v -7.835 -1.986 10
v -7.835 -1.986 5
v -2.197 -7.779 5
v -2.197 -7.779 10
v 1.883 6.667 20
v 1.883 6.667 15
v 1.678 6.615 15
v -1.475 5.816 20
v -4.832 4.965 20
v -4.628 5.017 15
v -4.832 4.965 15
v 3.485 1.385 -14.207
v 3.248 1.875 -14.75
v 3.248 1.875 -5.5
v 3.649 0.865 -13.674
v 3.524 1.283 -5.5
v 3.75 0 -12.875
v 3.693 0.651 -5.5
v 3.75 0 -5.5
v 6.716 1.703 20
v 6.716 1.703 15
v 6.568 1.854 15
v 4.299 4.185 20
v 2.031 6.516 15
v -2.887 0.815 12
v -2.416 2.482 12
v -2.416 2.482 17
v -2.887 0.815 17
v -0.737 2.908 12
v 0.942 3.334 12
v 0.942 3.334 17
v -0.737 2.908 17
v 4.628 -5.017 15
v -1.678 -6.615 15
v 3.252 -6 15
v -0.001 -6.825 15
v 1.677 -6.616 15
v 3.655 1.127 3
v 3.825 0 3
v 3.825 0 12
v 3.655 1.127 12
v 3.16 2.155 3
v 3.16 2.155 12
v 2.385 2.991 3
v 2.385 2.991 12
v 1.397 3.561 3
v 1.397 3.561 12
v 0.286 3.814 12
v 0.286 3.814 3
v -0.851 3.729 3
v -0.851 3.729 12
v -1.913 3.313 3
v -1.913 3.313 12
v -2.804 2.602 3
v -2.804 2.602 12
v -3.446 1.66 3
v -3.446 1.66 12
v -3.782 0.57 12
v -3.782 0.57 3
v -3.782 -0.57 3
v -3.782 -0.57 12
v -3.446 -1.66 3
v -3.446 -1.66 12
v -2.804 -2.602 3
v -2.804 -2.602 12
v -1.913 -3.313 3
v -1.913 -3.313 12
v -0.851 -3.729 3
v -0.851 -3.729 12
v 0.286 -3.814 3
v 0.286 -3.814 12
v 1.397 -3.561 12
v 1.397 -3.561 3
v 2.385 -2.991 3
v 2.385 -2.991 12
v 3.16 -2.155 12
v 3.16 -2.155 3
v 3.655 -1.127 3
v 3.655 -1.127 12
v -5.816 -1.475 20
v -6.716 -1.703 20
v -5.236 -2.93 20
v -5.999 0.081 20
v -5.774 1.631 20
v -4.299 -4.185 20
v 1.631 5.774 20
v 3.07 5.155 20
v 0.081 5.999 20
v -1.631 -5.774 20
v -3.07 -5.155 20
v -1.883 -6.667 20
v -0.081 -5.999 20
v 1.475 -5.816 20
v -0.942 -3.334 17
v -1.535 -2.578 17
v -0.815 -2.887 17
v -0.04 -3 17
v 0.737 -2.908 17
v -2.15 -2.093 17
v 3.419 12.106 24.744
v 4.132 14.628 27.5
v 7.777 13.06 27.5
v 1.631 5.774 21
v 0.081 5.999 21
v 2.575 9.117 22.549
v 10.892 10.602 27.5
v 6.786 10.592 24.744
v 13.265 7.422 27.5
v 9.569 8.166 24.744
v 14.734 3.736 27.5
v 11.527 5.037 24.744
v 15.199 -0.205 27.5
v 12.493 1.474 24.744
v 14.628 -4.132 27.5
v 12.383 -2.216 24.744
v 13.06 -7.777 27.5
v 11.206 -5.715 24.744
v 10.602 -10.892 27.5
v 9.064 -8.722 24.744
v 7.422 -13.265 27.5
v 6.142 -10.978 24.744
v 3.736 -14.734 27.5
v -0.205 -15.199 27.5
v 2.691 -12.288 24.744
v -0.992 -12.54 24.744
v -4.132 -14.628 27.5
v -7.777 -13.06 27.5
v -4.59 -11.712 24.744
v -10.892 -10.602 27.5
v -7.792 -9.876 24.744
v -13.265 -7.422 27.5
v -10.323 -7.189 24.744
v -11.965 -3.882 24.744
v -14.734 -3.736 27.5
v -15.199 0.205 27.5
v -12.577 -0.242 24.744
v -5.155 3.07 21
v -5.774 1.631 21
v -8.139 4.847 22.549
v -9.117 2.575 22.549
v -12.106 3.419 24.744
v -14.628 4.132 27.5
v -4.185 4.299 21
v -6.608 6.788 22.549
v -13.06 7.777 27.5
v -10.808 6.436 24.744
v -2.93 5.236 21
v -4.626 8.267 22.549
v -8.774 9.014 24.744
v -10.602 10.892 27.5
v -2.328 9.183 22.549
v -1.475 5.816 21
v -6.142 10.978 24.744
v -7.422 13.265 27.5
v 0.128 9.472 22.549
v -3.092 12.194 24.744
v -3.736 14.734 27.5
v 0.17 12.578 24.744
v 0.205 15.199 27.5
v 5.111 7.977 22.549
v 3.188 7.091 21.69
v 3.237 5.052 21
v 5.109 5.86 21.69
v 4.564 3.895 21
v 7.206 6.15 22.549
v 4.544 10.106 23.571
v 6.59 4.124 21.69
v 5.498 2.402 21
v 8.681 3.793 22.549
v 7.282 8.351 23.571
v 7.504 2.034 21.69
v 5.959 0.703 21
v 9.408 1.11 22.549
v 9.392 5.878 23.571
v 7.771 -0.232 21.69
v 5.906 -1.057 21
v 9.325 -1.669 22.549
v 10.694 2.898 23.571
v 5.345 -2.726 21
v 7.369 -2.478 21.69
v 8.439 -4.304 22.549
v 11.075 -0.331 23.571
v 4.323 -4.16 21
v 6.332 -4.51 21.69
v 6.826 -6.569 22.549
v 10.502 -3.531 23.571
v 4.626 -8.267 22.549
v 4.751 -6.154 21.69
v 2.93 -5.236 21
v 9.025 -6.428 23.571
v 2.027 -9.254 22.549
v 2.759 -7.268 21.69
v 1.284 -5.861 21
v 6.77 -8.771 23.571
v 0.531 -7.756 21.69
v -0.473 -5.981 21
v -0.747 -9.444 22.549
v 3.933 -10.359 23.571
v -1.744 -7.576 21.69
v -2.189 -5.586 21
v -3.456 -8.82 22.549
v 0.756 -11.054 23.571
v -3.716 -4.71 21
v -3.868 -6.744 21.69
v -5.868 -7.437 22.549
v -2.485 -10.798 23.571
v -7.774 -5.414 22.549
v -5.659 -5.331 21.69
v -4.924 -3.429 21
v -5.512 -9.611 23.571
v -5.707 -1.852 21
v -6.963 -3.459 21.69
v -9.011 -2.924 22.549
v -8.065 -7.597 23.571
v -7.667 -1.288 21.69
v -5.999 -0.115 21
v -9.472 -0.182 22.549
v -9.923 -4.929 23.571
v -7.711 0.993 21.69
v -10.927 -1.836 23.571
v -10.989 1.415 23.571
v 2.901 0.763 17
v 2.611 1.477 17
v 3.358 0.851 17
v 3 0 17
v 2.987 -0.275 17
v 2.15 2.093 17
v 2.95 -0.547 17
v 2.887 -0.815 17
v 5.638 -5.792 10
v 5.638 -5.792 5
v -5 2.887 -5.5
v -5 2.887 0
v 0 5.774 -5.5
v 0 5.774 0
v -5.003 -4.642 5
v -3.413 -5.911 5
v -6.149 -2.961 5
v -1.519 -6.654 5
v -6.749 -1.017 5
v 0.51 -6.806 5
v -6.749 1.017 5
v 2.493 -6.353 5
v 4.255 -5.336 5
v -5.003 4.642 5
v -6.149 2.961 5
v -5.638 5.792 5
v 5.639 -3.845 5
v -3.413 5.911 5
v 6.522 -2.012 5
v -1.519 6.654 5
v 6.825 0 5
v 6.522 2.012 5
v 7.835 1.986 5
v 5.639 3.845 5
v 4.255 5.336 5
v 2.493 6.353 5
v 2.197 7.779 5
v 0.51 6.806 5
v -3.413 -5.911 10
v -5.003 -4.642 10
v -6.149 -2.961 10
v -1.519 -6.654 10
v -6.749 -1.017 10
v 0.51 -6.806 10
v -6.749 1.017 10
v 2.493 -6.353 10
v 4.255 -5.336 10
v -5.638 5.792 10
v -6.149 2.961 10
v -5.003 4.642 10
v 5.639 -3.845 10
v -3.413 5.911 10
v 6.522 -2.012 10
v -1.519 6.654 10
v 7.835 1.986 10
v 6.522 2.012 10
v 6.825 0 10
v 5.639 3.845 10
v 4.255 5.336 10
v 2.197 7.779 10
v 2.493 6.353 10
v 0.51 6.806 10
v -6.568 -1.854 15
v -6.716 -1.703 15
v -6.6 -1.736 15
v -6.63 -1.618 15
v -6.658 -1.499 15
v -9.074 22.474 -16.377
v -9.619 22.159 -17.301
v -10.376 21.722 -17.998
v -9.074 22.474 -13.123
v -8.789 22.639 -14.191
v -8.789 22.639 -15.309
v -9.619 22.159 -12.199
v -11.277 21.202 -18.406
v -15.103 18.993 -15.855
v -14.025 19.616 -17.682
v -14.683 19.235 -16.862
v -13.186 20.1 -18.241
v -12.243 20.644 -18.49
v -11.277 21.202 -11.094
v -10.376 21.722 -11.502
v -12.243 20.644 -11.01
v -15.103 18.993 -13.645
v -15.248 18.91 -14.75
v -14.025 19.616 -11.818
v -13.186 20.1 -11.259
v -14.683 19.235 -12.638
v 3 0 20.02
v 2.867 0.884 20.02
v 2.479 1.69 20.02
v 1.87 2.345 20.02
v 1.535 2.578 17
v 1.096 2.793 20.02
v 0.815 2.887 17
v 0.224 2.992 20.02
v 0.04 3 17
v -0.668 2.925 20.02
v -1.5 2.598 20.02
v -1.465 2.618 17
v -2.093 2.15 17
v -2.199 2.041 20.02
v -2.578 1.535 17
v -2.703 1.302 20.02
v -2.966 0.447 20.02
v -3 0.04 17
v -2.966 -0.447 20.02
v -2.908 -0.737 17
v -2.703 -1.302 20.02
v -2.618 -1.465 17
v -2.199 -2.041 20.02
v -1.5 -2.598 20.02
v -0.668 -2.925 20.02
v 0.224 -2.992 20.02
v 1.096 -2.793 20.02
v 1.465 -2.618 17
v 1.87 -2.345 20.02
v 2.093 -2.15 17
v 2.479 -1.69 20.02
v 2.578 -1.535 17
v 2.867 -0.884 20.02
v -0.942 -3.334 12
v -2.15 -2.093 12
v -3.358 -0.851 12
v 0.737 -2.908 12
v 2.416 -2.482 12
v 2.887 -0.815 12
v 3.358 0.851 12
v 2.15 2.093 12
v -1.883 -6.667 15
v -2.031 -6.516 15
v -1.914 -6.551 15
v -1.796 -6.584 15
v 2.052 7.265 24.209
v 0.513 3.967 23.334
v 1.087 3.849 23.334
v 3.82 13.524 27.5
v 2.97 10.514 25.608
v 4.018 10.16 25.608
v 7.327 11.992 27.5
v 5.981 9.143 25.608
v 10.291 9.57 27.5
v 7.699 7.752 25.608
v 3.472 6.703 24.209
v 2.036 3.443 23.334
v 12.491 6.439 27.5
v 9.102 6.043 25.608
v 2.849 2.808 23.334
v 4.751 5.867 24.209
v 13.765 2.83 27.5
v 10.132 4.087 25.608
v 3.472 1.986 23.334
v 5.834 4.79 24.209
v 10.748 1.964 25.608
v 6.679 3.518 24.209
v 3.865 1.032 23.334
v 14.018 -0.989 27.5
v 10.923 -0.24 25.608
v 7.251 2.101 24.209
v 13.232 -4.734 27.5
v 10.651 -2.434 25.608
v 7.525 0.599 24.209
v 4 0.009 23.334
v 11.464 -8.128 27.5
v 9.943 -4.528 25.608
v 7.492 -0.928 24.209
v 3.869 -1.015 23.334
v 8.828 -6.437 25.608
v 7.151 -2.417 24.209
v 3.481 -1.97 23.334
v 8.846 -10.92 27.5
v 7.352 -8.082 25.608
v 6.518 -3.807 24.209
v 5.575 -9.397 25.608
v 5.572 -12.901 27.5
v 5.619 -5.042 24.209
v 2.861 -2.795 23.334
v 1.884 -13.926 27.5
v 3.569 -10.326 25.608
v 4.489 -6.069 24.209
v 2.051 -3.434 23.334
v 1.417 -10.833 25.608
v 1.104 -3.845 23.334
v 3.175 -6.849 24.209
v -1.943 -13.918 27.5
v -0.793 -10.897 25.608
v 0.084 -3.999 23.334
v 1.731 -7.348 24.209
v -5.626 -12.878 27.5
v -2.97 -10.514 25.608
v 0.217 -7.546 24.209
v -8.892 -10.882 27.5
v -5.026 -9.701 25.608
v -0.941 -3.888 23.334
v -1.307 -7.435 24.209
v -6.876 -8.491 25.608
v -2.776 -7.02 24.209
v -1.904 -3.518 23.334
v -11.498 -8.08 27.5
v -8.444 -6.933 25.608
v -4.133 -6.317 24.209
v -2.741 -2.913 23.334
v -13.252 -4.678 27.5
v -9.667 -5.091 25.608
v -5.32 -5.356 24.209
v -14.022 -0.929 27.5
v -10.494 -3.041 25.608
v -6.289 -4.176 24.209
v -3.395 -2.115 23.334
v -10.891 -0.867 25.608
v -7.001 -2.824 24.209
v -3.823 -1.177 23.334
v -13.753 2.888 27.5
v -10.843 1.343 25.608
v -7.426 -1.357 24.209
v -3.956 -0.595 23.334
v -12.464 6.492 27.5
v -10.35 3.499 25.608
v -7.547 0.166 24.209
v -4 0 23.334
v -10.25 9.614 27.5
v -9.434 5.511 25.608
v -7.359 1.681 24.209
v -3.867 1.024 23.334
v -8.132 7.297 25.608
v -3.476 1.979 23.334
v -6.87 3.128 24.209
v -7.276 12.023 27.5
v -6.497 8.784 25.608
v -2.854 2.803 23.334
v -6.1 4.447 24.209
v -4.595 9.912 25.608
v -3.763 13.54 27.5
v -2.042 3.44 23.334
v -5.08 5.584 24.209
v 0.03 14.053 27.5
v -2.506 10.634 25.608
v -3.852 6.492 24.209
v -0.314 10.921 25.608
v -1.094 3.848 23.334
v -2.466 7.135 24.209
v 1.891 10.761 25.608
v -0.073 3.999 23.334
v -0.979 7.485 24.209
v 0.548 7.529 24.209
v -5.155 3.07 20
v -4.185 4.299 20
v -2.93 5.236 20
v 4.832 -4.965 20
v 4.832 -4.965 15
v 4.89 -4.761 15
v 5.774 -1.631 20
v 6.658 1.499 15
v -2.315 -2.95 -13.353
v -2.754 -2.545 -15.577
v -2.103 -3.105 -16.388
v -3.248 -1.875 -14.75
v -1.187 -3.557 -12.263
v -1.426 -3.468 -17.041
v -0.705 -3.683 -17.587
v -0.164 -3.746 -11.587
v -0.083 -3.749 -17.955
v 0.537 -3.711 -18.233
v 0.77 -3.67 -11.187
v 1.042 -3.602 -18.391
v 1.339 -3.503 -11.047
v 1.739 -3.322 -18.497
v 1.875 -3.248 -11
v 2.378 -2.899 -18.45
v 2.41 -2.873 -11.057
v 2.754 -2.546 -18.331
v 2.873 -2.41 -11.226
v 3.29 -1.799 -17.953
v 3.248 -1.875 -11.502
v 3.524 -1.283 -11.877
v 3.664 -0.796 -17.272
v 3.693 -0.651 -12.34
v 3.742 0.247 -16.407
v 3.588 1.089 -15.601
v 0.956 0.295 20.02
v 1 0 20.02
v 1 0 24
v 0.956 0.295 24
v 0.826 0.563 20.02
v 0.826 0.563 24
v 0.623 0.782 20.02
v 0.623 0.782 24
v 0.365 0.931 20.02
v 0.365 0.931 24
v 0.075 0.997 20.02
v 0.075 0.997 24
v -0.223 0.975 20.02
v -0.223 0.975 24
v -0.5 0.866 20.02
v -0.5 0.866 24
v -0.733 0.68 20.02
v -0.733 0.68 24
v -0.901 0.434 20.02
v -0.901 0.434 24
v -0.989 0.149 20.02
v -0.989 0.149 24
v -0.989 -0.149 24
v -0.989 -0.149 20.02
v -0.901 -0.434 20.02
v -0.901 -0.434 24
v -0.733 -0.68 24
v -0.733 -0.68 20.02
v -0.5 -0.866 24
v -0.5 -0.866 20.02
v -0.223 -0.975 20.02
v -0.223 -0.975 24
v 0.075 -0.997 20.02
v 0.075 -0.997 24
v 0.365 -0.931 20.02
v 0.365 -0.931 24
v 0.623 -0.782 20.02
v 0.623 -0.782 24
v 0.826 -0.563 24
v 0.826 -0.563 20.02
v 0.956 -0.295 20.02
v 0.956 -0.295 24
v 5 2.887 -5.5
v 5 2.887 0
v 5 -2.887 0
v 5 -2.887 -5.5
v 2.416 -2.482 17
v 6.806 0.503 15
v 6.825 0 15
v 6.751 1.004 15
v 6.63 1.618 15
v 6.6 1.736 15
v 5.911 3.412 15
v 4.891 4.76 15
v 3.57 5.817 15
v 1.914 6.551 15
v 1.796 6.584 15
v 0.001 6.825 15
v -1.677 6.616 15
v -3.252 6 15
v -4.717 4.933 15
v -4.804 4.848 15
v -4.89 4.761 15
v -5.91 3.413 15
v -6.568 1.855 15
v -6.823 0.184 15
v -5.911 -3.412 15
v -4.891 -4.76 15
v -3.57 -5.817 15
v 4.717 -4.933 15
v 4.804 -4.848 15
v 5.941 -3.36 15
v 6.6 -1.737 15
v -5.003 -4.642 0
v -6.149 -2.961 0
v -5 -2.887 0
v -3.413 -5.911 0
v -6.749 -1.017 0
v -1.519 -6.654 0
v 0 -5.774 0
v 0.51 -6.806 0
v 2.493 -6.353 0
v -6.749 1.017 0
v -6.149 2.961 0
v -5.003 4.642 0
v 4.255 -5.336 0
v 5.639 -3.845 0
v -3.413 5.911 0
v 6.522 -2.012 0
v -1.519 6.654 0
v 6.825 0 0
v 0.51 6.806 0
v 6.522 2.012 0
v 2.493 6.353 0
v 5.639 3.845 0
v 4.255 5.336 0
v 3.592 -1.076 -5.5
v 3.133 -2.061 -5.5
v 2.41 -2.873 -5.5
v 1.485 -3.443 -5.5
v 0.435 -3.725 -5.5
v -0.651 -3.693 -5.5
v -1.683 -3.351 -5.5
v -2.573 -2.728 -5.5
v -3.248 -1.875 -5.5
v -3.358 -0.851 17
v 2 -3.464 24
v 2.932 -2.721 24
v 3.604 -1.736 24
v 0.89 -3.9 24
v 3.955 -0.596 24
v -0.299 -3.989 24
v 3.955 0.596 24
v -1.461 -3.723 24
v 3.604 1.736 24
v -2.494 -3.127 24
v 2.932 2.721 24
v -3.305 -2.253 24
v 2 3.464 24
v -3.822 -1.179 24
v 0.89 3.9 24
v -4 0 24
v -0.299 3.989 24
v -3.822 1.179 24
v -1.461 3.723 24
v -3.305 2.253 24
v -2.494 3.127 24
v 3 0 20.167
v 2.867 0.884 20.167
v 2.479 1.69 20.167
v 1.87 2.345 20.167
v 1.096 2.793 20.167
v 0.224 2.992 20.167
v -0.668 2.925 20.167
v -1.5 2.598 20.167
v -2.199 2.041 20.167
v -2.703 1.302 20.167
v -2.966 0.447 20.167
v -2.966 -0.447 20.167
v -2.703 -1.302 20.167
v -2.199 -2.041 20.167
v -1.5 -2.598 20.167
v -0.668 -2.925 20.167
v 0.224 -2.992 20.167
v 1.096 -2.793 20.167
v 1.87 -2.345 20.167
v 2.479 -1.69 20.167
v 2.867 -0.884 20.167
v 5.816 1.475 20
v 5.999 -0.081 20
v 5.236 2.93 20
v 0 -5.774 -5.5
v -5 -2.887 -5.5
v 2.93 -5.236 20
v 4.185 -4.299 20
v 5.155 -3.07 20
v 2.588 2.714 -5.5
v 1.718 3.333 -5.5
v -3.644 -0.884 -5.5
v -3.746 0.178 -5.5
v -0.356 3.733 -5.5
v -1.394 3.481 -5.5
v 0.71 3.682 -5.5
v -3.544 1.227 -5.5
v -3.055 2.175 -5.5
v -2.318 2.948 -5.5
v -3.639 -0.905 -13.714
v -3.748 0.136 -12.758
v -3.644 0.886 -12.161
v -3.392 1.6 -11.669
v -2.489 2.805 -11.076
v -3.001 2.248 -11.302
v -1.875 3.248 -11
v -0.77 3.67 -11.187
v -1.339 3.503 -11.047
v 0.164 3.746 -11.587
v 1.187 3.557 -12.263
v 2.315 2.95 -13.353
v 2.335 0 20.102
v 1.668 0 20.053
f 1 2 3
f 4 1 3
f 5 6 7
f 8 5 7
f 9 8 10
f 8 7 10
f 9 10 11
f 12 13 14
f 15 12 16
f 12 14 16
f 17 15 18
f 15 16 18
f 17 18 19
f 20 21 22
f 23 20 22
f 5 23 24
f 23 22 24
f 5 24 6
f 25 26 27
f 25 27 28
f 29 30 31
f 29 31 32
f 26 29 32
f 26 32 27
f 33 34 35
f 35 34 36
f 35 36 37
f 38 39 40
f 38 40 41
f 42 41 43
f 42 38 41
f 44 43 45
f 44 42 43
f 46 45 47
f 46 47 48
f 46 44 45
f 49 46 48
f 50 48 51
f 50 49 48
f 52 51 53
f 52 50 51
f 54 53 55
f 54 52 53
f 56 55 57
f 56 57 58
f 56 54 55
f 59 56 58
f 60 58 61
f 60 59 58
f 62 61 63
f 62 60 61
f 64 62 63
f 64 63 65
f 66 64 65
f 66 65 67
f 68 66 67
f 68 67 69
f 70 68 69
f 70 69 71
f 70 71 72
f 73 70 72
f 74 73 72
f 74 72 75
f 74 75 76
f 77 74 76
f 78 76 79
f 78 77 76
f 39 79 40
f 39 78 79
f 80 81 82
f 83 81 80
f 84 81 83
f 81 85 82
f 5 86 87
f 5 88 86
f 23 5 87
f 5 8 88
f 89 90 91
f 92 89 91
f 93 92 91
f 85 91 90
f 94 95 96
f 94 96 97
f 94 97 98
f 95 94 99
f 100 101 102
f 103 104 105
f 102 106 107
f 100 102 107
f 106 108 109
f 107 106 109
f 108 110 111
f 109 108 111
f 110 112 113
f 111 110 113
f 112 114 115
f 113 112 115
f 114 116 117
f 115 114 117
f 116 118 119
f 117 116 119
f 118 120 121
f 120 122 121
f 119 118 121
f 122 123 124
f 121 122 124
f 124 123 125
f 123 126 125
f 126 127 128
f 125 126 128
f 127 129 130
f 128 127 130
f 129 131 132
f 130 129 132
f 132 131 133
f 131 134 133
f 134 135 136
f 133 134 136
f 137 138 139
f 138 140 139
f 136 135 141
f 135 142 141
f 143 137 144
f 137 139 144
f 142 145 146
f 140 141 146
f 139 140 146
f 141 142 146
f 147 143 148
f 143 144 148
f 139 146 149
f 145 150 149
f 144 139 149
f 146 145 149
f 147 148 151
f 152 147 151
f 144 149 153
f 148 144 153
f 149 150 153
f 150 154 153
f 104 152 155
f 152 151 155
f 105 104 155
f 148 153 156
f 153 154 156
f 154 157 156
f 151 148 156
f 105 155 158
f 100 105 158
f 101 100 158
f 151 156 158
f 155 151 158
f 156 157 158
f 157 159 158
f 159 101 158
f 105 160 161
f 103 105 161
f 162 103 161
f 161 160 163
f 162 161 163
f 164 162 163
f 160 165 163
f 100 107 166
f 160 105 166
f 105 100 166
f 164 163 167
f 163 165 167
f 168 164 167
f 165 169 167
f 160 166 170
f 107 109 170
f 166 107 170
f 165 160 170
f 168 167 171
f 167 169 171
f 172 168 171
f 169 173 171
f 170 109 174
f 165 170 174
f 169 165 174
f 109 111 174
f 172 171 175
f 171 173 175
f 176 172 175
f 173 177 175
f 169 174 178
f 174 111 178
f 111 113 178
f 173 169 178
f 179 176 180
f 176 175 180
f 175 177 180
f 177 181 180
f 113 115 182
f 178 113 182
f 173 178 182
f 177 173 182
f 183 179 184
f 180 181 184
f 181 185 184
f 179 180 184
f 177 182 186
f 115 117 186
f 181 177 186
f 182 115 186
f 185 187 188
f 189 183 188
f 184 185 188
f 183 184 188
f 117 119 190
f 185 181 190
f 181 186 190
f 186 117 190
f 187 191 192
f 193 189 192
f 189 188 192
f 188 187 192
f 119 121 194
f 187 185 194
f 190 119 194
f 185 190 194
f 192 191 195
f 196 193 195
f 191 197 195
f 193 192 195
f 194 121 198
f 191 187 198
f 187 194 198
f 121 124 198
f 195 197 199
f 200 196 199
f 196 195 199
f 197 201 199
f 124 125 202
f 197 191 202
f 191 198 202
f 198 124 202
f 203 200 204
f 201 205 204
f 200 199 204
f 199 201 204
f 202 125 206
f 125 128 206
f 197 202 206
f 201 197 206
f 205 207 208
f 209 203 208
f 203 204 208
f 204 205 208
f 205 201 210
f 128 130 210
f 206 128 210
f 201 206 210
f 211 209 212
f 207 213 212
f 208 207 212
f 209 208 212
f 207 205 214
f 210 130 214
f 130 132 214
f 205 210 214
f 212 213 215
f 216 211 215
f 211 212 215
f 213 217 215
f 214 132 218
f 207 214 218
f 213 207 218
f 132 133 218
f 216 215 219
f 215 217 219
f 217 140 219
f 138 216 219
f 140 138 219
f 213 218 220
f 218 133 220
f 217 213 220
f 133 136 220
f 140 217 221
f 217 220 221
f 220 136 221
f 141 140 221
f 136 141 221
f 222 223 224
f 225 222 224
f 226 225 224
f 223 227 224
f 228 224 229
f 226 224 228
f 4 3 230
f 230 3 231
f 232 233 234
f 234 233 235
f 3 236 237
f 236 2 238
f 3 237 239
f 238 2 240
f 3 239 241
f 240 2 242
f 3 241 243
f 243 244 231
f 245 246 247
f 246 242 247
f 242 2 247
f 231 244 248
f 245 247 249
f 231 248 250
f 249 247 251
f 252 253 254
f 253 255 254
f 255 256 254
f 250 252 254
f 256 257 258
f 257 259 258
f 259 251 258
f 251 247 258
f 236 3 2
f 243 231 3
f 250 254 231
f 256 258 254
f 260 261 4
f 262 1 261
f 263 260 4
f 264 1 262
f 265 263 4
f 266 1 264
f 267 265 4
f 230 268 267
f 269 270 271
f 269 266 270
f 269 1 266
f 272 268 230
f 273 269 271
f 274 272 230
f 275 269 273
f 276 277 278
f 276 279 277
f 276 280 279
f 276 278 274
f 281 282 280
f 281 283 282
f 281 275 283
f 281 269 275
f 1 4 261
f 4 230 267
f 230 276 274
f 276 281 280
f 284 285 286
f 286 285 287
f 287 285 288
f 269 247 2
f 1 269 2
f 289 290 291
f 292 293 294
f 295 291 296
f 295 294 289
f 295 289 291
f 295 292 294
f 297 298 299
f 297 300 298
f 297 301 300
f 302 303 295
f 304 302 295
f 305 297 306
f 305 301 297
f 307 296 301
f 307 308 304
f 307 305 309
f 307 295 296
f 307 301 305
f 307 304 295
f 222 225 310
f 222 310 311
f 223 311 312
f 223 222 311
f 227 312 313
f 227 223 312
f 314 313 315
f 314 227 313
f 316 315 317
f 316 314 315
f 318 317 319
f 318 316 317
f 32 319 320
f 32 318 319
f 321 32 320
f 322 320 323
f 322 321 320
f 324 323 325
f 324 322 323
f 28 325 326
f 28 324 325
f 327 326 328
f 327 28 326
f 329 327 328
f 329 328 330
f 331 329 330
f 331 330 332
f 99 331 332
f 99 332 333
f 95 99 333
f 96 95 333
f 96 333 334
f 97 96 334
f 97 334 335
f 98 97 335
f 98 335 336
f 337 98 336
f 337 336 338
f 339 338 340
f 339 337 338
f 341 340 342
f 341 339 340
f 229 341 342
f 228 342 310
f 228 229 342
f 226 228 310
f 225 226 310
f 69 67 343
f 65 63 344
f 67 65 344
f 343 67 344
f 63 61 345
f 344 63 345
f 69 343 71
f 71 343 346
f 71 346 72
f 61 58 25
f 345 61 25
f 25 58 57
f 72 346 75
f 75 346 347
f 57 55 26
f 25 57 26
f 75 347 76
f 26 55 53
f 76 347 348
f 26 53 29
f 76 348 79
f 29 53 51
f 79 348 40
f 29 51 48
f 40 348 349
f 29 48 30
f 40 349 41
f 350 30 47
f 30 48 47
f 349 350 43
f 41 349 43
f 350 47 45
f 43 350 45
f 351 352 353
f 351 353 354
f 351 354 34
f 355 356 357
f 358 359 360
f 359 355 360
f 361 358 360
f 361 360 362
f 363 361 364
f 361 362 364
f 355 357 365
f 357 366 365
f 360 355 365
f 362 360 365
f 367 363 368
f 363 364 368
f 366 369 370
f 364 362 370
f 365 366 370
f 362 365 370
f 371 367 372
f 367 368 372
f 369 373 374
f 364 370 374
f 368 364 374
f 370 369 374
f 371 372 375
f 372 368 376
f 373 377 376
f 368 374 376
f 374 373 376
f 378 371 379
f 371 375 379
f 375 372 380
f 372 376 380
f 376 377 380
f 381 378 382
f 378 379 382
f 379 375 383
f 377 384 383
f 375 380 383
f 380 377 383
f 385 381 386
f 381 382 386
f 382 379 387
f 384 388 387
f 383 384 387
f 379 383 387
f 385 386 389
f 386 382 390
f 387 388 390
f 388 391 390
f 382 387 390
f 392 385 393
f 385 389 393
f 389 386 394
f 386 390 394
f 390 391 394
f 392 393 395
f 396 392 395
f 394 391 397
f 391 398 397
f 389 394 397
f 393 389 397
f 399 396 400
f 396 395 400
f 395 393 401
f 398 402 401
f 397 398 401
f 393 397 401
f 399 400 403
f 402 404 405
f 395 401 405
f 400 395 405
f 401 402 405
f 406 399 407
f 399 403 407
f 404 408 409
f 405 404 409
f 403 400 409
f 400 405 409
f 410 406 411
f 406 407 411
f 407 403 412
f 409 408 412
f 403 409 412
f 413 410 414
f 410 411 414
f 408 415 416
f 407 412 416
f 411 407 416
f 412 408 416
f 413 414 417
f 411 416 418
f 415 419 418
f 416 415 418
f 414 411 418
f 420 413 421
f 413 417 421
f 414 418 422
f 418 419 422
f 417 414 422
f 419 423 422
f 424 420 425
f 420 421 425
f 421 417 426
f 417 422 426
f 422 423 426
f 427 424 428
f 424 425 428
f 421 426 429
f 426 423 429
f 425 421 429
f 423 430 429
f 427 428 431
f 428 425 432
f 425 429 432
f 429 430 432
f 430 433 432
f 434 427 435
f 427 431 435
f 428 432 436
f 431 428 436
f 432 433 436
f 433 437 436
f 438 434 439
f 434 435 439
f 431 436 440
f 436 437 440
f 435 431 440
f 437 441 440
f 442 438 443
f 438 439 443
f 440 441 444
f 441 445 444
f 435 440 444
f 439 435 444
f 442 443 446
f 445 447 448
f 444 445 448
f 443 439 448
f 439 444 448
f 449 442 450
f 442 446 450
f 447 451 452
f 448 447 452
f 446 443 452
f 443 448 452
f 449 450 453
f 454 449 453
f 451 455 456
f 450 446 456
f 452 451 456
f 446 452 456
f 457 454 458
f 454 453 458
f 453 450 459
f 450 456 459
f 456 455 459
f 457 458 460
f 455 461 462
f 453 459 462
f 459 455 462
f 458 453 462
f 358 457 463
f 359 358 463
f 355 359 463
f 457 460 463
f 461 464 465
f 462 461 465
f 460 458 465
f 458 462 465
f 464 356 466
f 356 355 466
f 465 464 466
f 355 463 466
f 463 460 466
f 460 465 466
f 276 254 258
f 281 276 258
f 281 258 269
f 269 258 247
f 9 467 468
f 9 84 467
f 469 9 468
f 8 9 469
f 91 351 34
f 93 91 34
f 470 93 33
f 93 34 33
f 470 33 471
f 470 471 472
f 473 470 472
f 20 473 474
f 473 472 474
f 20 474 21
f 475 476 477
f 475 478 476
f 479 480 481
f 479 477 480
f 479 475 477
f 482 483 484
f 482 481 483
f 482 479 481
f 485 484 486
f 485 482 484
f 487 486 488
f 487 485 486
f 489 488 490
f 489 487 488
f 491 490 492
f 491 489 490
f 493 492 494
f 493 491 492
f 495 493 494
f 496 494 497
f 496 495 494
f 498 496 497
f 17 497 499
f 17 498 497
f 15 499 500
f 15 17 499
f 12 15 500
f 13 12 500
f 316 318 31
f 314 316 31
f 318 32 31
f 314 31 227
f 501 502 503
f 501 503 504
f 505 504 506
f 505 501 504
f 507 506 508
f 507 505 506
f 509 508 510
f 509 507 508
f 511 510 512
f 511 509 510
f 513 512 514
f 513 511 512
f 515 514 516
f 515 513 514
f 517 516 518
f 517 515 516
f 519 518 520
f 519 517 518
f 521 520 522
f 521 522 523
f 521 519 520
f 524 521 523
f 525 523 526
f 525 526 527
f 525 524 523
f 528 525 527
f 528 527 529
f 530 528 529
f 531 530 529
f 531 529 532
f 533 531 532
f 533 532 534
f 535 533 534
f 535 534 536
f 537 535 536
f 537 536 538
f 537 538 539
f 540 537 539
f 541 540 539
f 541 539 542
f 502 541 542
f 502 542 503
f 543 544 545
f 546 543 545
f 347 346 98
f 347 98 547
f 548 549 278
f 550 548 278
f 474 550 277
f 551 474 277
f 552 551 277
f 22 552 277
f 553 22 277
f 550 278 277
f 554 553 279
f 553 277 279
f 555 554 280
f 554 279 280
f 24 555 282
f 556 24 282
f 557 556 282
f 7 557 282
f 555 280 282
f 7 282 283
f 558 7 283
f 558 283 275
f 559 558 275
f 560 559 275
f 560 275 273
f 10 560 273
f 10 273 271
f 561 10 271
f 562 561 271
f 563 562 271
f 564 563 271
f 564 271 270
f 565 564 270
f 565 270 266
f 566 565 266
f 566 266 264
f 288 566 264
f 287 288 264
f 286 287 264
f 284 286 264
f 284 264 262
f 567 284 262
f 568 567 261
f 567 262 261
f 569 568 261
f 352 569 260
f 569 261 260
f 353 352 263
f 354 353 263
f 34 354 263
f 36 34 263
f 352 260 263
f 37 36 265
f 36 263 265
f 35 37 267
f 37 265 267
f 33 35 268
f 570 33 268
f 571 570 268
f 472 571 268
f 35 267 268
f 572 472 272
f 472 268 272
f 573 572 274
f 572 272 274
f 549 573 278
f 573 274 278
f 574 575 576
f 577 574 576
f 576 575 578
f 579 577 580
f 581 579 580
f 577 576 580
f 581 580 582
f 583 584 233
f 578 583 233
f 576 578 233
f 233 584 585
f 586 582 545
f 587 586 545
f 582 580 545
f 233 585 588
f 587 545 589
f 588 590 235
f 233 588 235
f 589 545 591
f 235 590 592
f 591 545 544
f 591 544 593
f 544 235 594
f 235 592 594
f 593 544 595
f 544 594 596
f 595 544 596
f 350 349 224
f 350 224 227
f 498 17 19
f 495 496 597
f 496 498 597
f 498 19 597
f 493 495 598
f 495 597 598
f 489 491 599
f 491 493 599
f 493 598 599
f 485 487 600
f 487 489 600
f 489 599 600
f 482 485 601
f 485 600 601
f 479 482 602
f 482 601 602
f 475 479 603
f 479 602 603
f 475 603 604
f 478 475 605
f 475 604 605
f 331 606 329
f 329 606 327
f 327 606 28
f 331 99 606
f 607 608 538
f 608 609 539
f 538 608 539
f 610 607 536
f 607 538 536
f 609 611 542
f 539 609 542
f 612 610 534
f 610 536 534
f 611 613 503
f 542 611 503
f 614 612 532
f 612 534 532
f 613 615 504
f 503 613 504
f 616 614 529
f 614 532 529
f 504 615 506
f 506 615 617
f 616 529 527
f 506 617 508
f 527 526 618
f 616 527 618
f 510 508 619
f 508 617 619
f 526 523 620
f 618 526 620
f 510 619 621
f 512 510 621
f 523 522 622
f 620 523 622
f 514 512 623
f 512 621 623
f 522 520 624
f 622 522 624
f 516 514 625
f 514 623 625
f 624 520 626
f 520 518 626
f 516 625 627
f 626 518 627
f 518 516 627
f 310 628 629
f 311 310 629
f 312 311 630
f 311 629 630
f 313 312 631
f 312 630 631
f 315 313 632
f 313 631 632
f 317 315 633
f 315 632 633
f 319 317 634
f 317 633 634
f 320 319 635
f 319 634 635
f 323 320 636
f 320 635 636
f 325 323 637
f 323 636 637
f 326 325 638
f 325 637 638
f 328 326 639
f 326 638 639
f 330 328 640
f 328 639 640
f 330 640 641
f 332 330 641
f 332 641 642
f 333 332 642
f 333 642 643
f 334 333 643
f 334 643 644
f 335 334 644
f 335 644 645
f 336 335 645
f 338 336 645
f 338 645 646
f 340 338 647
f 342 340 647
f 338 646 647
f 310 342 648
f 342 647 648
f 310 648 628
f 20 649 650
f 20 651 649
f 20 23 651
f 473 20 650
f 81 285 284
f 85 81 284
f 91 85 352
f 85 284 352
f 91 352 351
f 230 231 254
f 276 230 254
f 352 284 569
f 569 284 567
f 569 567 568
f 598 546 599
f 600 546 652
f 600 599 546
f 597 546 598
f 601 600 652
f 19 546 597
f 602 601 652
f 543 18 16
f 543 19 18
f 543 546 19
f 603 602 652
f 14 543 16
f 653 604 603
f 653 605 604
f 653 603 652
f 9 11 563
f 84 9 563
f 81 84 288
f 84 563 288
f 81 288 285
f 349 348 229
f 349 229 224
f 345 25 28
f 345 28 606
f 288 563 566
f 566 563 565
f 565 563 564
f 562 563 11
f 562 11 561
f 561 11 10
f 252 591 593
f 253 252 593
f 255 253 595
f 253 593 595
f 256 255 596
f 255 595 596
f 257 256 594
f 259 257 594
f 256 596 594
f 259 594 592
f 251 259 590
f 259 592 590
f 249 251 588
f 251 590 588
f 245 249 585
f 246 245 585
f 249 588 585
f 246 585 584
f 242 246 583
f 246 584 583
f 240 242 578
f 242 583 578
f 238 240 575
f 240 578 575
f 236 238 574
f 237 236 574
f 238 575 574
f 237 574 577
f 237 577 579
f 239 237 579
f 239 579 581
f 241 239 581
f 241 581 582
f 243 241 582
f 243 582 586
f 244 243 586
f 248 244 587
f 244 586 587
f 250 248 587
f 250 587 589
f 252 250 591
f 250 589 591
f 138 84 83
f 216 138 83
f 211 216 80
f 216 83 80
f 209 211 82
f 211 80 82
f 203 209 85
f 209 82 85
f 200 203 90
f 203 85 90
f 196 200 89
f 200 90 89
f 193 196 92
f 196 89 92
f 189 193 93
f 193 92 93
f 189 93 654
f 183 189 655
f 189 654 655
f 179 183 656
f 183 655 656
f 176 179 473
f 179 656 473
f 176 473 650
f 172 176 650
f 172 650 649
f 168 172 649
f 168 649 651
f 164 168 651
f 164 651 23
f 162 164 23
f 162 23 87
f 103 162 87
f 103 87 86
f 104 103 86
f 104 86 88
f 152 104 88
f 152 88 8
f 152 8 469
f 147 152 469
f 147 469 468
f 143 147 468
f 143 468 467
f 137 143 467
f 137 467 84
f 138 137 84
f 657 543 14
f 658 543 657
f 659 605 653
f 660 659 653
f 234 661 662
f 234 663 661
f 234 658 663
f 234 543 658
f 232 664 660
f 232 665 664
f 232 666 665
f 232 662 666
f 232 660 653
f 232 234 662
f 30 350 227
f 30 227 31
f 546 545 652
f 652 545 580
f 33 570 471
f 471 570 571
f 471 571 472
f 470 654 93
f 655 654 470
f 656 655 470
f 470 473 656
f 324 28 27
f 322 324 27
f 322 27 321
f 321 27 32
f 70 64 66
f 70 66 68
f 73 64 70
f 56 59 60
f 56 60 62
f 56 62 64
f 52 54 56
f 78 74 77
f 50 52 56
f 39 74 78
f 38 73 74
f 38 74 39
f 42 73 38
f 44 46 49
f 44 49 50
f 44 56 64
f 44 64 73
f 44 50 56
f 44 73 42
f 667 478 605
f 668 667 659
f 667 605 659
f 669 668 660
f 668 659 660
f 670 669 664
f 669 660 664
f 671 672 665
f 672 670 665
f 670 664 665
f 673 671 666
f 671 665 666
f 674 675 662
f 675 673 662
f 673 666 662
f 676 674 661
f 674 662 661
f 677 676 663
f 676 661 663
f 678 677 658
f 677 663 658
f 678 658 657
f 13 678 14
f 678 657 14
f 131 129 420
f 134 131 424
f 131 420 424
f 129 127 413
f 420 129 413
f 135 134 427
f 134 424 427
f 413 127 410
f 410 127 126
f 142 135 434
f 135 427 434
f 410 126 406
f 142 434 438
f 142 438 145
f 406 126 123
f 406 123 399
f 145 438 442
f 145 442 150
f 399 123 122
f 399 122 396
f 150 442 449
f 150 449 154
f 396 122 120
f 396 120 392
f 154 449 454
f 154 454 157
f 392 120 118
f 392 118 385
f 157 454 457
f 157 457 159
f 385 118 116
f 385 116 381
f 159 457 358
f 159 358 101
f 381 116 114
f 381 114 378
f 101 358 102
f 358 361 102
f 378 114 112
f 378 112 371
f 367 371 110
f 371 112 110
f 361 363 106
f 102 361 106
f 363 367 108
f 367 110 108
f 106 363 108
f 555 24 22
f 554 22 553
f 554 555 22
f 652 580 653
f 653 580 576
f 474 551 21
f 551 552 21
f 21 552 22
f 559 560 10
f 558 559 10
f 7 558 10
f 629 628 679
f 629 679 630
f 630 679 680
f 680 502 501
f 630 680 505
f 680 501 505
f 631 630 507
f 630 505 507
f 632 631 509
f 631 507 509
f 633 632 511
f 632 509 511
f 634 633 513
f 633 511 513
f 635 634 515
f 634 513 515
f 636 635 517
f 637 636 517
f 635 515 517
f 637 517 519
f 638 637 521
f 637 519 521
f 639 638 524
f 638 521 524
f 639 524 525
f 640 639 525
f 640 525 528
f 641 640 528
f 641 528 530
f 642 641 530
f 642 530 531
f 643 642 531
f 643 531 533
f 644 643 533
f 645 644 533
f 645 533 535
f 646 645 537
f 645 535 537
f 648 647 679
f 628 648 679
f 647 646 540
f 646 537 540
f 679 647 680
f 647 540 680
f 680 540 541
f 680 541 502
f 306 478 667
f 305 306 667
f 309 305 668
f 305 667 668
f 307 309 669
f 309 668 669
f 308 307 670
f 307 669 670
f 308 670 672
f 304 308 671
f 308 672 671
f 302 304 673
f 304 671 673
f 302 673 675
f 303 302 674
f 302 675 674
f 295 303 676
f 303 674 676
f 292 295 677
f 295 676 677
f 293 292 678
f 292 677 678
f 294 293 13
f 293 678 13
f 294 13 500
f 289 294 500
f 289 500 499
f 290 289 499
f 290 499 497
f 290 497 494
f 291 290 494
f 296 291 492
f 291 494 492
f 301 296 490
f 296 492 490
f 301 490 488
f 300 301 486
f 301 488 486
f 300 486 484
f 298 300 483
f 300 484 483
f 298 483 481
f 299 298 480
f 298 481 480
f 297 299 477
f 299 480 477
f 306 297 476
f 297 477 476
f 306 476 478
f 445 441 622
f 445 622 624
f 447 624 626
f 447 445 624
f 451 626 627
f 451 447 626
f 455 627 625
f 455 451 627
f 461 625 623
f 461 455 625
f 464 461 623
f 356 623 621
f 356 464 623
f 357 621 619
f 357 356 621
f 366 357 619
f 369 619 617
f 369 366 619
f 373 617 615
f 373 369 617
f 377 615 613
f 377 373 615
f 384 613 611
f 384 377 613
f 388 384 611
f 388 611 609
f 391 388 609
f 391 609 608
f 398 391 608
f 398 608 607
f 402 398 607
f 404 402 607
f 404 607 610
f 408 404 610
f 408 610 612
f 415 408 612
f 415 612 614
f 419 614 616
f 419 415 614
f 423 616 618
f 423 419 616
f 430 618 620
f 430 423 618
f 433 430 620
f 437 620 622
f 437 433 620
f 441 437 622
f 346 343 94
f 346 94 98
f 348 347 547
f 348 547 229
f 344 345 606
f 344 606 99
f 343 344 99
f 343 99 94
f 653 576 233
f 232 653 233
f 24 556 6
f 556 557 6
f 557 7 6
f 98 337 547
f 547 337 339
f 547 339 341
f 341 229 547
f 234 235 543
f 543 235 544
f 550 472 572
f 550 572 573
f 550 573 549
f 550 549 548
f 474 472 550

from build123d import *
from build123d.topology import SkipClean

# Parameters (mm, degrees)
ESQUISSE1_R             = 6.825
BOSS_EXTRU_1_DEPTH      = 5
BOSS_EXTRU_2_DEPTH      = 5
ESQUISSE3_R             = 6.825
BOSS_EXTRU_3_DEPTH      = 5
BOSS_EXTRU_4_DEPTH      = 5
ESQUISSE5_R             = 6
BOSS_EXTRU_5_DEPTH      = 1
ESQUISSE8_R             = 4
BOSS_EXTRU_6_DEPTH      = 4
COQUE1_START            = 3
COQUE1_OUTLINE_R        = 3
COQUE1_DEPTH            = 17.019936639
COQUE1_2_OUTLINE_R      = 3.825
COQUE1_2_OUTLINE_R_2    = 3
COQUE1_2_DEPTH          = 9
COQUE1_START_2          = 12
COQUE1_3_DEPTH          = 5
COQUE1_START_3          = 17
COQUE1_4_OUTLINE_R      = 1
COQUE1_4_DEPTH          = 7
BOSS_EXTRU_7_DEPTH      = 5.5
ESQUISSE11_R            = 3.75
BOSS_EXTRU_8_DEPTH      = 13
BOSS_EXTRU_9_DEPTH      = 19
BOSS_EXTRU_9_DEPTH_BACK = 11
ESQUISSE15_R            = 3.75
ENL_V_MAT_EXTRU_1_DEPTH = 36
ENL_V_MAT_EXTRU_2_DEPTH = 24


with BuildPart() as part:
    # Esquisse1 → Boss.-Extru.1 (new body)
    with BuildSketch(Plane.XY):
        Circle(ESQUISSE1_R)
    extrude(amount=BOSS_EXTRU_1_DEPTH)

    # Esquisse2 → Boss.-Extru.2 (add)
    with BuildSketch(Plane.XY.offset(5)):
        Polygon((2.197146908, 7.778552487), (-5.637850605, 5.792061282), (-7.834997513, -1.986491205), (-2.197146908, -7.778552487), (5.637850605, -5.792061282), (7.834997513, 1.986491205), align=None)
    extrude(amount=BOSS_EXTRU_2_DEPTH)

    # Esquisse3 → Boss.-Extru.3 (add)
    with BuildSketch(Plane.XY.offset(10)):
        Circle(ESQUISSE3_R)
    extrude(amount=BOSS_EXTRU_3_DEPTH)

    # Esquisse4 → Boss.-Extru.4 (add)
    with BuildSketch(Plane.XY.offset(15)):
        Polygon((1.883268778, 6.667330703), (-4.832443375, 4.964623956), (-6.715712154, -1.702706748), (-1.883268778, -6.667330703), (4.832443375, -4.964623956), (6.715712154, 1.702706748), align=None)
    extrude(amount=BOSS_EXTRU_4_DEPTH)

    # Esquisse5 → Boss.-Extru.5 (add)
    with BuildSketch(Plane.XY.offset(20)):
        with Locations(Location((0, 0, 0), (0, 0, 164.227020734))):
            Circle(ESQUISSE5_R)
    extrude(amount=BOSS_EXTRU_5_DEPTH)

    # Esquisse6 → Révolution1 (revolve)
    with BuildSketch(Plane(origin=(0, 0, 0), x_dir=(0, 0, 1), z_dir=(-0.9623462940986051, 0.2718264340248778, 0))):
        with BuildLine():
            Line((27.5, 15.2), (27.5, 14.053156671))
            ThreePointArc((27.5, 14.053156671), (24.153582084, 7.377792349), (23.001548337, 0))
            Line((23.001548337, 0), (20.000668758, 0))
            ThreePointArc((20.000668758, 0), (22.010684231, 8.458303467), (27.5, 15.2))
        make_face()
    revolve(axis=Axis((0, 0, 27.429189789), (0, 0, -1)))

    # Esquisse8 → Boss.-Extru.6 (add)
    with BuildSketch(Plane(origin=(0, 0, 20), x_dir=(-1, 0, 0), z_dir=(0, 0, -1))):
        Circle(ESQUISSE8_R)
    extrude(amount=-BOSS_EXTRU_6_DEPTH)

    # Coque1: read off the stored shape, not the designer's step
    # Coque1 outline → Coque1 (cut)
    with BuildSketch(Plane.XY.offset(COQUE1_START)):
        Circle(COQUE1_OUTLINE_R)
    extrude(amount=COQUE1_DEPTH, mode=Mode.SUBTRACT)

    # Coque1 2 outline → Coque1 2 (cut)
    with BuildSketch(Plane.XY.offset(COQUE1_START)):
        Circle(COQUE1_2_OUTLINE_R)
        Circle(COQUE1_2_OUTLINE_R_2, mode=Mode.SUBTRACT)
    extrude(amount=COQUE1_2_DEPTH, mode=Mode.SUBTRACT)

    # Coque1 3 outline → Coque1 3 (cut)
    with BuildSketch(Plane.XY.offset(COQUE1_START_2)):
        with BuildLine():
            Line((-2.887038883, 0.815479301), (-3.357856077, -0.851353374))
            Line((-3.357856077, -0.851353374), (-2.149745259, -2.092509336))
            ThreePointArc((-2.149745259, -2.092509336), (-2.907988669, -0.737293632), (-2.887038883, 0.815479301))
        make_face()
        with BuildLine():
            Line((-2.416221688, 2.482311978), (-2.887038883, 0.815479301))
            ThreePointArc((-2.887038883, 0.815479301), (-2.092509359, 2.149745237), (-0.737293637, 2.907988668))
            Line((-0.737293637, 2.907988668), (-2.416221688, 2.482311978))
        make_face()
        with BuildLine():
            ThreePointArc((0.737293647, -2.907988665), (-0.815479321, -2.887038877), (-2.149745259, -2.092509336))
            Line((-2.149745259, -2.092509336), (-0.941634389, -3.333665352))
            Line((-0.941634389, -3.333665352), (0.737293647, -2.907988665))
        make_face()
        with BuildLine():
            Line((0.941634389, 3.333665352), (-0.737293637, 2.907988668))
            ThreePointArc((-0.737293637, 2.907988668), (0.815479327, 2.887038875), (2.149745261, 2.092509334))
            Line((2.149745261, 2.092509334), (0.941634389, 3.333665352))
        make_face()
        with BuildLine():
            ThreePointArc((2.887038882, -0.815479302), (2.092509362, -2.149745234), (0.737293647, -2.907988665))
            Line((0.737293647, -2.907988665), (2.416221688, -2.482311978))
            Line((2.416221688, -2.482311978), (2.887038882, -0.815479302))
        make_face()
        with BuildLine():
            Line((3.357856077, 0.851353374), (2.149745261, 2.092509334))
            ThreePointArc((2.149745261, 2.092509334), (2.90798867, 0.73729363), (2.887038882, -0.815479302))
            Line((2.887038882, -0.815479302), (3.357856077, 0.851353374))
        make_face()
    extrude(amount=COQUE1_3_DEPTH, mode=Mode.SUBTRACT)

    # Coque1 4 outline → Coque1 4 (cut)
    with BuildSketch(Plane.XY.offset(COQUE1_START_3)):
        Circle(COQUE1_4_OUTLINE_R)
    extrude(amount=COQUE1_4_DEPTH, mode=Mode.SUBTRACT)

    # Coque1 5 outline → Coque1 5 (revolve, cut)
    with BuildSketch(Plane.XZ):
        with BuildLine():
            ThreePointArc((3.000000027, 20.167494226), (2.001360363, 20.075277066), (0.999999973, 20.019936738))
            Line((0.999999973, 20.019936738), (3, 20.019936639))
            Line((3, 20.019936639), (3.000000027, 20.167494226))
        make_face()
    revolve(axis=Axis((0, 0, 0), (0, 0, 1)), mode=Mode.SUBTRACT)

    # Esquisse10 → Boss.-Extru.7 (add)
    with BuildSketch(Plane(origin=(0, 0, 0), x_dir=(-1, 0, 0), z_dir=(0, 0, -1))):
        Polygon((5, -2.886751346), (5, 2.886751346), (0, 5.773502692), (-5, 2.886751346), (-5, -2.886751346), (0, -5.773502692), align=None)
    extrude(amount=BOSS_EXTRU_7_DEPTH)

    # Esquisse11 → Boss.-Extru.8 (add)
    with BuildSketch(Plane(origin=(0, 0, -5.5), x_dir=(-1, 0, 0), z_dir=(0, 0, -1))):
        with Locations(Location((0, 0, 0), (0, 0, 180))):
            Circle(ESQUISSE11_R)
    extrude(amount=BOSS_EXTRU_8_DEPTH)

    # Esquisse15 → Boss.-Extru.9 (add, two sides: drawn at the far end of the back side and taken through both)
    with BuildSketch(Plane(origin=(-2.5, 4.330127019, 0), x_dir=(0.8660254037844387, 0.4999999999999999, 0), z_dir=(-0.49999999999999994, 0.8660254037844388, 0)).offset(-BOSS_EXTRU_9_DEPTH_BACK)):
        with Locations(Location((0, 14.75, 0), (0, 0, 180))):
            Circle(ESQUISSE15_R)
    extrude(amount=BOSS_EXTRU_9_DEPTH + BOSS_EXTRU_9_DEPTH_BACK)

    # Esquisse17 → Enlèv. mat.-Extru.1 (cut)
    with BuildSketch(Plane(origin=(-12, 20.784609691, 0), x_dir=(0.8660254037844386, 0.5, 0), z_dir=(-0.5000000000000001, 0.8660254037844387, 0))):
        with BuildLine():
            Line((3.75, 14.75), (7.089373521, 14.75))
            Line((7.089373521, 14.75), (7.089373521, 20.468856948))
            Line((7.089373521, 20.468856948), (-7.00273048, 20.468856948))
            Line((-7.00273048, 20.468856948), (-7.00273048, 14.75))
            Line((-7.00273048, 14.75), (-3.75, 14.75))
            ThreePointArc((-3.75, 14.75), (0, 18.5), (3.75, 14.75))
        make_face()
    extrude(amount=-ENL_V_MAT_EXTRU_1_DEPTH, mode=Mode.SUBTRACT)

    # Esquisse18 → Enlèv. mat.-Extru.2 (cut)
    with SkipClean():  # the faces are left unmerged after this step: merging them gives an invalid solid
        with BuildSketch(Plane(origin=(0, 0, -5.5), x_dir=(-1, 0, 0), z_dir=(0, 0, -1))):
            with BuildLine():
                Line((14.892554705, -8.598220468), (3.247595264, -1.875))
                ThreePointArc((3.247595264, -1.875), (-1.875, -3.247595264), (-3.247595264, 1.875))
                Line((-3.247595264, 1.875), (-12.633967987, 7.294224818))
                Line((-12.633967987, 7.294224818), (-3.446061764, -21.412882035))
                Line((-3.446061764, -21.412882035), (14.892554705, -8.598220468))
            make_face()
        extrude(amount=ENL_V_MAT_EXTRU_2_DEPTH, mode=Mode.SUBTRACT)


solid = part.part
